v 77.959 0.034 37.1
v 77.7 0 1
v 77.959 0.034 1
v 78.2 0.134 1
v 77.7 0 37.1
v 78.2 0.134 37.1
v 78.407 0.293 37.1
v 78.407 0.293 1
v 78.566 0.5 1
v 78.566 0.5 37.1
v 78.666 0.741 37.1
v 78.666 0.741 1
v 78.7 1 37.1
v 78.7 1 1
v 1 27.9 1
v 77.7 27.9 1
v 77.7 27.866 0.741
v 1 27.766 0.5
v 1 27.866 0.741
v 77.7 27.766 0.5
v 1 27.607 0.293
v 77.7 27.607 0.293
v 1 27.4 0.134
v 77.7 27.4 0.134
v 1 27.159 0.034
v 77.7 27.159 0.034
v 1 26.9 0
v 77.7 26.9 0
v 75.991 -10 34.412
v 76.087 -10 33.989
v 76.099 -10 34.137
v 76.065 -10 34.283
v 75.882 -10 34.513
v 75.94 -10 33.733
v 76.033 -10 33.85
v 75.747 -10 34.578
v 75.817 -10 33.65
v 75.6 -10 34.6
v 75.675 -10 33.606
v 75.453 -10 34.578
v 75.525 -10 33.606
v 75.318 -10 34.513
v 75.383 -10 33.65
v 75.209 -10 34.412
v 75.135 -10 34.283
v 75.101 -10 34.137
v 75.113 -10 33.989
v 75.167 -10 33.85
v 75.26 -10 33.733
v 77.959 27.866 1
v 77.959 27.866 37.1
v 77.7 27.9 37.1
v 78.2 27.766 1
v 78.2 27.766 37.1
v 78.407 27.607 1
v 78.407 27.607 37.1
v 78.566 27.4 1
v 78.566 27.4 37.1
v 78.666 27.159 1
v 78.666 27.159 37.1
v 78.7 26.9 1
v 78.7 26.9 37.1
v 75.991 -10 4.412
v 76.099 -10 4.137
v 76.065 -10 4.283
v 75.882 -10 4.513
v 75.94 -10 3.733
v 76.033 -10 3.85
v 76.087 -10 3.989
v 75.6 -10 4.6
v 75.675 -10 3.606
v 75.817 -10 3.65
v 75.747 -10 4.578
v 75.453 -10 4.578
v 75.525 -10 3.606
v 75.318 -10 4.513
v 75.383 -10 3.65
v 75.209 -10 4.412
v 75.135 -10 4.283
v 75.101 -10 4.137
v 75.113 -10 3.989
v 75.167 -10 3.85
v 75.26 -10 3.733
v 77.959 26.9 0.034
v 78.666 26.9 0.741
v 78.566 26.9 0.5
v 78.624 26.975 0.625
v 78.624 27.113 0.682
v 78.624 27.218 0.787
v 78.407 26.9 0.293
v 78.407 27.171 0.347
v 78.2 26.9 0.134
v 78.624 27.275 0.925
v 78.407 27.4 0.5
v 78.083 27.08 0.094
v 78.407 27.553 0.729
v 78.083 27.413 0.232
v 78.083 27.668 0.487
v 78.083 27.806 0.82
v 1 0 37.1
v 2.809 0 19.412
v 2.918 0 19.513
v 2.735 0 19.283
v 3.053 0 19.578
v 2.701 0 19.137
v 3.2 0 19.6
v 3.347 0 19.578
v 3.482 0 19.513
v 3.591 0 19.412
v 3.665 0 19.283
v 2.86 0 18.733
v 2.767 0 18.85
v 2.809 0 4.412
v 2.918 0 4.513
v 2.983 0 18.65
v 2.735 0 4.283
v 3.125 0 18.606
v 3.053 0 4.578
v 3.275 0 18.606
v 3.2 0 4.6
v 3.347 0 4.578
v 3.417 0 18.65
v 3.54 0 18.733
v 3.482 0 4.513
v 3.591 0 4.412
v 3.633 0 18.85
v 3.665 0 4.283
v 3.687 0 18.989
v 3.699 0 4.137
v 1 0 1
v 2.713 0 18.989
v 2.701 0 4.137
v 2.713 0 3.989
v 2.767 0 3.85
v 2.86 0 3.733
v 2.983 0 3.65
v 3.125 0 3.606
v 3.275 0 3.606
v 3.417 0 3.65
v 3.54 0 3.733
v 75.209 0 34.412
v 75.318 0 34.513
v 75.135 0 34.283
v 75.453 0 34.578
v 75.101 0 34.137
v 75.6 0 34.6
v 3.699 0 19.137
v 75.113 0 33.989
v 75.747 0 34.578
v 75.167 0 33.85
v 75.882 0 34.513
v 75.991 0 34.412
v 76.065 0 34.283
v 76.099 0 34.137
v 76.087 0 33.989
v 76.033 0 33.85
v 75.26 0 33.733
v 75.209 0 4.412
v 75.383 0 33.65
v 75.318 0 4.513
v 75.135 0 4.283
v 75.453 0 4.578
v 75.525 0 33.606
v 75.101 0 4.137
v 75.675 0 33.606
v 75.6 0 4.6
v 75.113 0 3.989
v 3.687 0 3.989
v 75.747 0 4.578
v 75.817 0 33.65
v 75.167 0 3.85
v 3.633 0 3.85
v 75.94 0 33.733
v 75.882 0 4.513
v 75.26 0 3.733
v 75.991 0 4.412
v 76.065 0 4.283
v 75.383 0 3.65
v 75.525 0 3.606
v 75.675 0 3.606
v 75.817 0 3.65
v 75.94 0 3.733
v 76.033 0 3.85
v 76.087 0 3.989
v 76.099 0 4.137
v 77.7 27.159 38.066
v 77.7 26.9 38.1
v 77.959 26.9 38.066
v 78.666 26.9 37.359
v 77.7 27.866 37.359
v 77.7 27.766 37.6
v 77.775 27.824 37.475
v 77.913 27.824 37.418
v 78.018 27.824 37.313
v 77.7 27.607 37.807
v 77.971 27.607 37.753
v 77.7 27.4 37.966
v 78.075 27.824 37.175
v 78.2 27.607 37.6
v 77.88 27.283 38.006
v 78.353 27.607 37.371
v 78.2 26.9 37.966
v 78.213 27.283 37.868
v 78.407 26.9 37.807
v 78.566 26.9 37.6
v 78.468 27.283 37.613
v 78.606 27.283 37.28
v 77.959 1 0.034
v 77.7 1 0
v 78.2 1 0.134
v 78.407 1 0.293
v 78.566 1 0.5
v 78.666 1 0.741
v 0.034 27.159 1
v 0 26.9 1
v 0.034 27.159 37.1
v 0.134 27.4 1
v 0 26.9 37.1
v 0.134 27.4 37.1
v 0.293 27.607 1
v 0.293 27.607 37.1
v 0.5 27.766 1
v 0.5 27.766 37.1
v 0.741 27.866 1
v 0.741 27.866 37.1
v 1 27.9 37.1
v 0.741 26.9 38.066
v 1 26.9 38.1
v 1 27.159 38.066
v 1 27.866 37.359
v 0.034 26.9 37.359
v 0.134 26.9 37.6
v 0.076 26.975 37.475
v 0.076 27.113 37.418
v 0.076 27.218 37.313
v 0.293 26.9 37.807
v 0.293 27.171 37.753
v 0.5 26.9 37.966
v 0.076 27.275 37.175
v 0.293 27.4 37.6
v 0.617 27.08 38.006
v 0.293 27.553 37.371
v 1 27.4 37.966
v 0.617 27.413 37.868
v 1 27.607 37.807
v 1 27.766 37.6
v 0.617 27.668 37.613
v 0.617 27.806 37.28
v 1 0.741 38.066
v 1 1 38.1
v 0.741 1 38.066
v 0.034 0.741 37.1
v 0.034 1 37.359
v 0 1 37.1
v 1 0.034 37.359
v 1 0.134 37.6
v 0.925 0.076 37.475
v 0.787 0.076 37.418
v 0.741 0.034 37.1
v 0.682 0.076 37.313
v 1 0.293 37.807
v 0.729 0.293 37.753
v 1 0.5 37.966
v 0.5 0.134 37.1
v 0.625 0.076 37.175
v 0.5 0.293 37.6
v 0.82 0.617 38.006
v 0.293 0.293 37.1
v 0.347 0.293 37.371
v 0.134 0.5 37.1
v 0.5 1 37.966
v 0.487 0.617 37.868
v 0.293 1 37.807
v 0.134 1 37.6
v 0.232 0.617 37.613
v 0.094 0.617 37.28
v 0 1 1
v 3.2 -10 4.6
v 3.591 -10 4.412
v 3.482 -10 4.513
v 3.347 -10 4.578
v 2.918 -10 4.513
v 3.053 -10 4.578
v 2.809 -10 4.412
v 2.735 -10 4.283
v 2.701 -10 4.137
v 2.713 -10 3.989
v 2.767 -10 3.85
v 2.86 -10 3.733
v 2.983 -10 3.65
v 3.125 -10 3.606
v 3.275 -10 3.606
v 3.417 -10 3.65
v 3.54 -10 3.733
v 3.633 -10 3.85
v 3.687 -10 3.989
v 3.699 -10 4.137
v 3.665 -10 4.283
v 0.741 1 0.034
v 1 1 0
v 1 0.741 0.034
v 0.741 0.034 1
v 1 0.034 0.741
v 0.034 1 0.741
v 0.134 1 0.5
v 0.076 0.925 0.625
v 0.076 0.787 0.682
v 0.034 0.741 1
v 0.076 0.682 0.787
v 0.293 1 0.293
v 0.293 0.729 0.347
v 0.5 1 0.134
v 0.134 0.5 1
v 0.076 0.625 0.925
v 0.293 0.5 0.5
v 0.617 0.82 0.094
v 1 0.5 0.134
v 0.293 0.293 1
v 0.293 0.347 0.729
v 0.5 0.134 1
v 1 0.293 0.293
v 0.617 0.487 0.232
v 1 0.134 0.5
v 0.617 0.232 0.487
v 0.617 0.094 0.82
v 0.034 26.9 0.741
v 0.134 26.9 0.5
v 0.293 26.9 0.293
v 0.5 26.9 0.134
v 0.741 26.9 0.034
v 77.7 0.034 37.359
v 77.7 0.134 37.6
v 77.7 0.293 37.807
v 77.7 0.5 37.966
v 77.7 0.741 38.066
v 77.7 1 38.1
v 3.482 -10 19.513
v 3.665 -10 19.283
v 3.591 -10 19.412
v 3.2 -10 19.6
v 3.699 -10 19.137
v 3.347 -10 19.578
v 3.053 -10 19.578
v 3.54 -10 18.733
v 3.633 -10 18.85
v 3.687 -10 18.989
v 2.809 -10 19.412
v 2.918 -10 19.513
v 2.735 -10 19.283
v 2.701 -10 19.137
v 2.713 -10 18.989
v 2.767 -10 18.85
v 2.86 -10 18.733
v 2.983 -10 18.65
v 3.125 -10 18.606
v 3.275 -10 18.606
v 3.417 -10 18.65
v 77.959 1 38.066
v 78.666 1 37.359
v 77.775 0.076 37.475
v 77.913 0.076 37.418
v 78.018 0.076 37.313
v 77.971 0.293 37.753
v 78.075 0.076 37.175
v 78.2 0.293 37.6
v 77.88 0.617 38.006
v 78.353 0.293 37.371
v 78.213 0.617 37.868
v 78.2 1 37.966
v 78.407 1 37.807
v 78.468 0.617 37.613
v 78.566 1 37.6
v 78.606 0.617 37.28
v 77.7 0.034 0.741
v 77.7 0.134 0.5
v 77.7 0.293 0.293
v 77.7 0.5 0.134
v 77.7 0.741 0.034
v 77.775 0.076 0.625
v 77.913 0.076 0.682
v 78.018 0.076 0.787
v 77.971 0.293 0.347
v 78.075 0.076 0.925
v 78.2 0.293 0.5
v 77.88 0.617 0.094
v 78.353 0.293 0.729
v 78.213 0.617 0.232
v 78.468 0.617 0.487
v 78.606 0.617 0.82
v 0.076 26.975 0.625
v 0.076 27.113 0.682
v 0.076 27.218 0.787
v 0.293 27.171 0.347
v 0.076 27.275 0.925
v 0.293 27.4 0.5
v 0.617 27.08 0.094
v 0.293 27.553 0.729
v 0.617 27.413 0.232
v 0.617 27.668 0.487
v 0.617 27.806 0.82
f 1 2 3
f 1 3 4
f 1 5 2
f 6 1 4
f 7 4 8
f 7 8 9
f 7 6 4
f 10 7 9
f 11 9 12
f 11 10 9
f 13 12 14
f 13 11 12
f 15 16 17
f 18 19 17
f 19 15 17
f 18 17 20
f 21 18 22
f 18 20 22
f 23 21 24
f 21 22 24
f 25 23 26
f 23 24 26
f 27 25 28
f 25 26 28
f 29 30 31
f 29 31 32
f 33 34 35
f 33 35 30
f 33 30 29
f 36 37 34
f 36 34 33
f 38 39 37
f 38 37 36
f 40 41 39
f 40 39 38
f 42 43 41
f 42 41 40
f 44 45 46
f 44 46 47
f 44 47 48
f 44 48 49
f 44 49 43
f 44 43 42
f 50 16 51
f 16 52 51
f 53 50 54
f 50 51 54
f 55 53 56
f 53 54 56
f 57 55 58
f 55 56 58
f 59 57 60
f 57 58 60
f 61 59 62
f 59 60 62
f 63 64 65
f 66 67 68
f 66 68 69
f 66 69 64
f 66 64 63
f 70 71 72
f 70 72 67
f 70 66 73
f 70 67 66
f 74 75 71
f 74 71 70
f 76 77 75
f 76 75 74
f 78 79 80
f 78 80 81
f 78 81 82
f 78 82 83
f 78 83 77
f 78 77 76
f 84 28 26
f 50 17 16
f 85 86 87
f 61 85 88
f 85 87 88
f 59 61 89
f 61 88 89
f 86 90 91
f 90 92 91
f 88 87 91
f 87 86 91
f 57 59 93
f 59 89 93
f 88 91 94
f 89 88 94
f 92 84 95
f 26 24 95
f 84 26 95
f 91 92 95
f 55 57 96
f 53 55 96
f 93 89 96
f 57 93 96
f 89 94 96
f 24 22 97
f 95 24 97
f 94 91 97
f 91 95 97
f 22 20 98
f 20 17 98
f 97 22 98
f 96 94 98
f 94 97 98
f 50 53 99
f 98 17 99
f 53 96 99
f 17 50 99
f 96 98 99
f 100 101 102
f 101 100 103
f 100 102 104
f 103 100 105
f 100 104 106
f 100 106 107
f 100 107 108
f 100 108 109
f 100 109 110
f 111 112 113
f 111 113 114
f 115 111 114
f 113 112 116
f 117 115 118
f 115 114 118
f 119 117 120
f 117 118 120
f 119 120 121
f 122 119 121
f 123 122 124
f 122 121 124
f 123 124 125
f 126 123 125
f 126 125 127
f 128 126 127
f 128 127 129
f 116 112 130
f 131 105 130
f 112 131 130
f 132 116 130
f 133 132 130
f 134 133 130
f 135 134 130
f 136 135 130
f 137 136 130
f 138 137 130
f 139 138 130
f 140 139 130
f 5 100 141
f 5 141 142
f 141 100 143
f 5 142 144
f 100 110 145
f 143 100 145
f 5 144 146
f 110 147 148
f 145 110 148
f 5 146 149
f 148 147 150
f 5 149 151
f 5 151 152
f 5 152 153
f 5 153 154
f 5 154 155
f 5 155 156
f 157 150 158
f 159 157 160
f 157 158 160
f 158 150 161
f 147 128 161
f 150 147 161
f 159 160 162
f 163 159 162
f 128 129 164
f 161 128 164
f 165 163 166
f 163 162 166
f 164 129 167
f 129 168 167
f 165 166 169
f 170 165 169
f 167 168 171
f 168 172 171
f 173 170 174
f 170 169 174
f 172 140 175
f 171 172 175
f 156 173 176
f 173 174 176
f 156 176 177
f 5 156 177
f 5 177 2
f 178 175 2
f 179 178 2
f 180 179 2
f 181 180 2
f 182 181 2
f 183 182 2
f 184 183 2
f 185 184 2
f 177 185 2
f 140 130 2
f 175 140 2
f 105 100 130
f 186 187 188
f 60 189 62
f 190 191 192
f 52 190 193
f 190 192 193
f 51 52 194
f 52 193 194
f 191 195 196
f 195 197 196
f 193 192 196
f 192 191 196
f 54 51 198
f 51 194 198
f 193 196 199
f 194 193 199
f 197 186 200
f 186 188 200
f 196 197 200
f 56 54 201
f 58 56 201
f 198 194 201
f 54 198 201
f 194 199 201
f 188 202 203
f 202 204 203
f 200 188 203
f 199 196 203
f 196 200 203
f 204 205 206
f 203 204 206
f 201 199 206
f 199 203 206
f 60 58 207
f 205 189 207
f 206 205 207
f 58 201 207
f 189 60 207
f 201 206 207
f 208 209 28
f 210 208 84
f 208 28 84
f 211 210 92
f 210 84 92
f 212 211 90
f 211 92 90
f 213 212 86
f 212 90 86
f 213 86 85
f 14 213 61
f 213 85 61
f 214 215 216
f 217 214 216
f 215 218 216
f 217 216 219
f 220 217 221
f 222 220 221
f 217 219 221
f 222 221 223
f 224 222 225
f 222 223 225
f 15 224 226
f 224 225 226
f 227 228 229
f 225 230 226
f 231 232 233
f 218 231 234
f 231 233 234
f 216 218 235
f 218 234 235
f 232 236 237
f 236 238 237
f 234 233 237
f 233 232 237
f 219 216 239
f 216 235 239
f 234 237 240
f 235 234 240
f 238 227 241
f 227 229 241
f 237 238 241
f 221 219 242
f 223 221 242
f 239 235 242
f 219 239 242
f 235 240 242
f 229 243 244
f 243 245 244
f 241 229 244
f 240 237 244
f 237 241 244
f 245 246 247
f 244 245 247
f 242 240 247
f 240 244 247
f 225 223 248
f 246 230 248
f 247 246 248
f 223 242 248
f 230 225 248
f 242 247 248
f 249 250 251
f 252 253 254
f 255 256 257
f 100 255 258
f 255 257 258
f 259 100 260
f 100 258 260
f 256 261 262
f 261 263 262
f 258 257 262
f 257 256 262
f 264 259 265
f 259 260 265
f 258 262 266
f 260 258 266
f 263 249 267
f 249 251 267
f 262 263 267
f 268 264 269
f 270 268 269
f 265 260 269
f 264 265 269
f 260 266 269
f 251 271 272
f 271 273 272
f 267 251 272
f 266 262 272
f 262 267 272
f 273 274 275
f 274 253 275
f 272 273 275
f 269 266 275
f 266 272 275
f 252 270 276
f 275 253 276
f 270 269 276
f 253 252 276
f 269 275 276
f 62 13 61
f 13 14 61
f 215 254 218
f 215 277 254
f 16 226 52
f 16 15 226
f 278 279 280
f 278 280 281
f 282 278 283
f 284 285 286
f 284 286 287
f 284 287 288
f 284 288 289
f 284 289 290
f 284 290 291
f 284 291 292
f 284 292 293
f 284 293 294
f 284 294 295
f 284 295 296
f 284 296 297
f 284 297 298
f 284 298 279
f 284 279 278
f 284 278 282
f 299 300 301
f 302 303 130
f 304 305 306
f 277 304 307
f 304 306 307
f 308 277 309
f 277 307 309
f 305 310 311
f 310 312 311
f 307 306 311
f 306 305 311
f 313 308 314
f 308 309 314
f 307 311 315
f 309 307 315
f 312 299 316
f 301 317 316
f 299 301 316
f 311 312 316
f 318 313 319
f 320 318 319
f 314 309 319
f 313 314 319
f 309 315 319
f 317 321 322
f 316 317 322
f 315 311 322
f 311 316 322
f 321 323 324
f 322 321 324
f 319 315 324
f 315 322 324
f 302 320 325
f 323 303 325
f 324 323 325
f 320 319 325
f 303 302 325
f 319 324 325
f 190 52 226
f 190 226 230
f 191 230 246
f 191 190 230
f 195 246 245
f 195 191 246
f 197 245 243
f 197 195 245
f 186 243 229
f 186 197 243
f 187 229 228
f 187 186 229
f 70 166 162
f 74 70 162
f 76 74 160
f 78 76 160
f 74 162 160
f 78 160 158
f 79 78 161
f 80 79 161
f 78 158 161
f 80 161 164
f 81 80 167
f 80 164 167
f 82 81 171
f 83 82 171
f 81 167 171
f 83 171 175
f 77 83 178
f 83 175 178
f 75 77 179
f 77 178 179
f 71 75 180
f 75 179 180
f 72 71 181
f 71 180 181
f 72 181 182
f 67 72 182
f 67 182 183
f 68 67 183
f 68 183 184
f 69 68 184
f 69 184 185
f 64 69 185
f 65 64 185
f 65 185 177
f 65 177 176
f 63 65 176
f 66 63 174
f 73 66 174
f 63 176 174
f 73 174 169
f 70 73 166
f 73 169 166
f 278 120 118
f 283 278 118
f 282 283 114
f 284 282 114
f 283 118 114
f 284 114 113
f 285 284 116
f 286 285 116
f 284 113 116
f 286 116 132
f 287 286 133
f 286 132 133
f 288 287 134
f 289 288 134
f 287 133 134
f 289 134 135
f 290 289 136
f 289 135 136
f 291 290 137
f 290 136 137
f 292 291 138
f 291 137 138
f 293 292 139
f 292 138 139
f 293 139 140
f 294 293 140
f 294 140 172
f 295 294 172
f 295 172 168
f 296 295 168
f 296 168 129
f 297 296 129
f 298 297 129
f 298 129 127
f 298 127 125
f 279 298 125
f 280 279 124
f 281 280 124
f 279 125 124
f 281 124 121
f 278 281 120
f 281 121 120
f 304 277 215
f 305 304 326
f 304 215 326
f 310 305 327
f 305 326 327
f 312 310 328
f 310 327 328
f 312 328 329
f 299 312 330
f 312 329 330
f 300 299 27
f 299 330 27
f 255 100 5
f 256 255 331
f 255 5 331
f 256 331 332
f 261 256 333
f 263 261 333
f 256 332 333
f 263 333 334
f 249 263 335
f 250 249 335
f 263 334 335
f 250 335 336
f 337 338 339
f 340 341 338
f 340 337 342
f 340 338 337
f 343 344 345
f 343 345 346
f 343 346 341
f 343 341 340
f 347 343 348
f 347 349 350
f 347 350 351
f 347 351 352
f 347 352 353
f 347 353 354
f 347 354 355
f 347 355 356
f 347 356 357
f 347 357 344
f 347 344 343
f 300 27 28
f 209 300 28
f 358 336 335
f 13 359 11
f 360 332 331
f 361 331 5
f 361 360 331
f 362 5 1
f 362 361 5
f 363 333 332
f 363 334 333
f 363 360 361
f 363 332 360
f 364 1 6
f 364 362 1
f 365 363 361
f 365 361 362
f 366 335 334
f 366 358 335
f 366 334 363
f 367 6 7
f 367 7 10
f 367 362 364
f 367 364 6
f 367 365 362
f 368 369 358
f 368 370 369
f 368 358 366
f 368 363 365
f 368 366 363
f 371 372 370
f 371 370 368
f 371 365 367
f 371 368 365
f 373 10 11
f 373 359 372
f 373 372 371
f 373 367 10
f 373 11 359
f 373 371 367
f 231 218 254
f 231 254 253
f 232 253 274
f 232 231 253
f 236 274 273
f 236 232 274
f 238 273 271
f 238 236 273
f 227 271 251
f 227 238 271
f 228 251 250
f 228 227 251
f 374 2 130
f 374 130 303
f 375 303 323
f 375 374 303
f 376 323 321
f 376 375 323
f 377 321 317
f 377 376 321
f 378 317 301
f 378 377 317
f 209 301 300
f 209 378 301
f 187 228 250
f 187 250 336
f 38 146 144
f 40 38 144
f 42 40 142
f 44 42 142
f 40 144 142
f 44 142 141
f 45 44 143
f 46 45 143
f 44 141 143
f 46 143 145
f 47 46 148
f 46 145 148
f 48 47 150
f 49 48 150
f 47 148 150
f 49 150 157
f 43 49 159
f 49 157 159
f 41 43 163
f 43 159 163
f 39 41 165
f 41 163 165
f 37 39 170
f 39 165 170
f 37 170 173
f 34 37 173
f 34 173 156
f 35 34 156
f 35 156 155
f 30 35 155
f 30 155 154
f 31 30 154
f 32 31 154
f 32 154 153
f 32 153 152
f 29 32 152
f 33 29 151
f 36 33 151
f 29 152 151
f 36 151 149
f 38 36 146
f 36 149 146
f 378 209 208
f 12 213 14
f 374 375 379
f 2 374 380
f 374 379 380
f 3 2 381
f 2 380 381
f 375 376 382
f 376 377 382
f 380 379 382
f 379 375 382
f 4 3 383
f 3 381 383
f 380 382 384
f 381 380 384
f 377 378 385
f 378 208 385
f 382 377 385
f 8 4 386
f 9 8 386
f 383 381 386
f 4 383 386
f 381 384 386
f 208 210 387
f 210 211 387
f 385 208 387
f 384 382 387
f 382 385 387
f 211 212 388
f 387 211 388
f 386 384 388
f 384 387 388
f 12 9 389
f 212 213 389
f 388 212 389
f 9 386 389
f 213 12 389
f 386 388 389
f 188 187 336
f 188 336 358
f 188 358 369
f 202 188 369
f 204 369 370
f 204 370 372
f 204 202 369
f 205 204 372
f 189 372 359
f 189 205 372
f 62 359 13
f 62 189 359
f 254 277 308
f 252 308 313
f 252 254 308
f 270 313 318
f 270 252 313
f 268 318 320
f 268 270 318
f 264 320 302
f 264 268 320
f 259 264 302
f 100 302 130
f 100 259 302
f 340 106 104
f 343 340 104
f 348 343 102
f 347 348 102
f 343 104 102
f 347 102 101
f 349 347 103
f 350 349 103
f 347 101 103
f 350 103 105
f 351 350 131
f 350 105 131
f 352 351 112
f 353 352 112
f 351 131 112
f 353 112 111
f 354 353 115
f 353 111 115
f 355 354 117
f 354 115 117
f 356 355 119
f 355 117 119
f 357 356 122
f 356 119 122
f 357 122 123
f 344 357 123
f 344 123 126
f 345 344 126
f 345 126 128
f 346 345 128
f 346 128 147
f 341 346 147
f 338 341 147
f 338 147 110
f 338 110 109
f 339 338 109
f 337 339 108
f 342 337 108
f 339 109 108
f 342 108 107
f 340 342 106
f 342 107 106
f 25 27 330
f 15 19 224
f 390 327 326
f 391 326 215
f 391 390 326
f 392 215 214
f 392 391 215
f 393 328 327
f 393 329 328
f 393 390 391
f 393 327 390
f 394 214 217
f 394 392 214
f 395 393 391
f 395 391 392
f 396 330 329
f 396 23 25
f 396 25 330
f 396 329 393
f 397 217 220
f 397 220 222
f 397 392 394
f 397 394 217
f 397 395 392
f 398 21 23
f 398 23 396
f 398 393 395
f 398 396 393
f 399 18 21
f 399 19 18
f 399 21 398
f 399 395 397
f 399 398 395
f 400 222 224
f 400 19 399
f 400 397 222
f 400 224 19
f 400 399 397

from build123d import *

# Parameters (mm, degrees)
SKETCH1_W           = 78.7
SKETCH1_H           = 27.9
BOSS_EXTRUDE1_DEPTH = 38.1
SKETCH2_R           = 0.5
BOSS_EXTRUDE2_DEPTH = 10
FILLET1_R           = 1


with BuildPart() as part:
    # Sketch1 → Boss-Extrude1 (new body)
    with BuildSketch(Plane.XY):
        with Locations((39.35, 13.95)):
            Rectangle(SKETCH1_W, SKETCH1_H)
    extrude(amount=BOSS_EXTRUDE1_DEPTH)

    # Sketch2 → Boss-Extrude2 (add)
    with BuildSketch(Plane(origin=(0, 0, 0), x_dir=(-1, 0, 0), z_dir=(0, -1, 0))):
        with Locations(Location((-3.2, -4.1, 0), (0, 0, 270))):
            Circle(SKETCH2_R)
        with Locations(Location((-75.6, -4.1, 0), (0, 0, 270))):
            Circle(SKETCH2_R)
        with Locations(Location((-75.6, -34.1, 0), (0, 0, 270))):
            Circle(SKETCH2_R)
        with Locations(Location((-3.2, -19.1, 0), (0, 0, 270))):
            Circle(SKETCH2_R)
    extrude(amount=BOSS_EXTRUDE2_DEPTH)

    # Fillet1
    fillet1_edges = [part.edges().sort_by_distance(p)[0] for p in [
        (78.7, 13.95, 38.1),
        (39.35, 27.9, 38.1),
        (0, 13.95, 38.1),
        (39.35, 27.9, 0),
        (78.7, 13.95, 0),
        (39.35, 0, 0),
        (0, 13.95, 0),
        (39.35, 0, 38.1),
        (0, 27.9, 19.05),
        (78.7, 27.9, 19.05),
        (78.7, 0, 19.05),
        (0, 0, 19.05),
    ]]
    fillet(fillet1_edges, radius=FILLET1_R)


solid = part.part
